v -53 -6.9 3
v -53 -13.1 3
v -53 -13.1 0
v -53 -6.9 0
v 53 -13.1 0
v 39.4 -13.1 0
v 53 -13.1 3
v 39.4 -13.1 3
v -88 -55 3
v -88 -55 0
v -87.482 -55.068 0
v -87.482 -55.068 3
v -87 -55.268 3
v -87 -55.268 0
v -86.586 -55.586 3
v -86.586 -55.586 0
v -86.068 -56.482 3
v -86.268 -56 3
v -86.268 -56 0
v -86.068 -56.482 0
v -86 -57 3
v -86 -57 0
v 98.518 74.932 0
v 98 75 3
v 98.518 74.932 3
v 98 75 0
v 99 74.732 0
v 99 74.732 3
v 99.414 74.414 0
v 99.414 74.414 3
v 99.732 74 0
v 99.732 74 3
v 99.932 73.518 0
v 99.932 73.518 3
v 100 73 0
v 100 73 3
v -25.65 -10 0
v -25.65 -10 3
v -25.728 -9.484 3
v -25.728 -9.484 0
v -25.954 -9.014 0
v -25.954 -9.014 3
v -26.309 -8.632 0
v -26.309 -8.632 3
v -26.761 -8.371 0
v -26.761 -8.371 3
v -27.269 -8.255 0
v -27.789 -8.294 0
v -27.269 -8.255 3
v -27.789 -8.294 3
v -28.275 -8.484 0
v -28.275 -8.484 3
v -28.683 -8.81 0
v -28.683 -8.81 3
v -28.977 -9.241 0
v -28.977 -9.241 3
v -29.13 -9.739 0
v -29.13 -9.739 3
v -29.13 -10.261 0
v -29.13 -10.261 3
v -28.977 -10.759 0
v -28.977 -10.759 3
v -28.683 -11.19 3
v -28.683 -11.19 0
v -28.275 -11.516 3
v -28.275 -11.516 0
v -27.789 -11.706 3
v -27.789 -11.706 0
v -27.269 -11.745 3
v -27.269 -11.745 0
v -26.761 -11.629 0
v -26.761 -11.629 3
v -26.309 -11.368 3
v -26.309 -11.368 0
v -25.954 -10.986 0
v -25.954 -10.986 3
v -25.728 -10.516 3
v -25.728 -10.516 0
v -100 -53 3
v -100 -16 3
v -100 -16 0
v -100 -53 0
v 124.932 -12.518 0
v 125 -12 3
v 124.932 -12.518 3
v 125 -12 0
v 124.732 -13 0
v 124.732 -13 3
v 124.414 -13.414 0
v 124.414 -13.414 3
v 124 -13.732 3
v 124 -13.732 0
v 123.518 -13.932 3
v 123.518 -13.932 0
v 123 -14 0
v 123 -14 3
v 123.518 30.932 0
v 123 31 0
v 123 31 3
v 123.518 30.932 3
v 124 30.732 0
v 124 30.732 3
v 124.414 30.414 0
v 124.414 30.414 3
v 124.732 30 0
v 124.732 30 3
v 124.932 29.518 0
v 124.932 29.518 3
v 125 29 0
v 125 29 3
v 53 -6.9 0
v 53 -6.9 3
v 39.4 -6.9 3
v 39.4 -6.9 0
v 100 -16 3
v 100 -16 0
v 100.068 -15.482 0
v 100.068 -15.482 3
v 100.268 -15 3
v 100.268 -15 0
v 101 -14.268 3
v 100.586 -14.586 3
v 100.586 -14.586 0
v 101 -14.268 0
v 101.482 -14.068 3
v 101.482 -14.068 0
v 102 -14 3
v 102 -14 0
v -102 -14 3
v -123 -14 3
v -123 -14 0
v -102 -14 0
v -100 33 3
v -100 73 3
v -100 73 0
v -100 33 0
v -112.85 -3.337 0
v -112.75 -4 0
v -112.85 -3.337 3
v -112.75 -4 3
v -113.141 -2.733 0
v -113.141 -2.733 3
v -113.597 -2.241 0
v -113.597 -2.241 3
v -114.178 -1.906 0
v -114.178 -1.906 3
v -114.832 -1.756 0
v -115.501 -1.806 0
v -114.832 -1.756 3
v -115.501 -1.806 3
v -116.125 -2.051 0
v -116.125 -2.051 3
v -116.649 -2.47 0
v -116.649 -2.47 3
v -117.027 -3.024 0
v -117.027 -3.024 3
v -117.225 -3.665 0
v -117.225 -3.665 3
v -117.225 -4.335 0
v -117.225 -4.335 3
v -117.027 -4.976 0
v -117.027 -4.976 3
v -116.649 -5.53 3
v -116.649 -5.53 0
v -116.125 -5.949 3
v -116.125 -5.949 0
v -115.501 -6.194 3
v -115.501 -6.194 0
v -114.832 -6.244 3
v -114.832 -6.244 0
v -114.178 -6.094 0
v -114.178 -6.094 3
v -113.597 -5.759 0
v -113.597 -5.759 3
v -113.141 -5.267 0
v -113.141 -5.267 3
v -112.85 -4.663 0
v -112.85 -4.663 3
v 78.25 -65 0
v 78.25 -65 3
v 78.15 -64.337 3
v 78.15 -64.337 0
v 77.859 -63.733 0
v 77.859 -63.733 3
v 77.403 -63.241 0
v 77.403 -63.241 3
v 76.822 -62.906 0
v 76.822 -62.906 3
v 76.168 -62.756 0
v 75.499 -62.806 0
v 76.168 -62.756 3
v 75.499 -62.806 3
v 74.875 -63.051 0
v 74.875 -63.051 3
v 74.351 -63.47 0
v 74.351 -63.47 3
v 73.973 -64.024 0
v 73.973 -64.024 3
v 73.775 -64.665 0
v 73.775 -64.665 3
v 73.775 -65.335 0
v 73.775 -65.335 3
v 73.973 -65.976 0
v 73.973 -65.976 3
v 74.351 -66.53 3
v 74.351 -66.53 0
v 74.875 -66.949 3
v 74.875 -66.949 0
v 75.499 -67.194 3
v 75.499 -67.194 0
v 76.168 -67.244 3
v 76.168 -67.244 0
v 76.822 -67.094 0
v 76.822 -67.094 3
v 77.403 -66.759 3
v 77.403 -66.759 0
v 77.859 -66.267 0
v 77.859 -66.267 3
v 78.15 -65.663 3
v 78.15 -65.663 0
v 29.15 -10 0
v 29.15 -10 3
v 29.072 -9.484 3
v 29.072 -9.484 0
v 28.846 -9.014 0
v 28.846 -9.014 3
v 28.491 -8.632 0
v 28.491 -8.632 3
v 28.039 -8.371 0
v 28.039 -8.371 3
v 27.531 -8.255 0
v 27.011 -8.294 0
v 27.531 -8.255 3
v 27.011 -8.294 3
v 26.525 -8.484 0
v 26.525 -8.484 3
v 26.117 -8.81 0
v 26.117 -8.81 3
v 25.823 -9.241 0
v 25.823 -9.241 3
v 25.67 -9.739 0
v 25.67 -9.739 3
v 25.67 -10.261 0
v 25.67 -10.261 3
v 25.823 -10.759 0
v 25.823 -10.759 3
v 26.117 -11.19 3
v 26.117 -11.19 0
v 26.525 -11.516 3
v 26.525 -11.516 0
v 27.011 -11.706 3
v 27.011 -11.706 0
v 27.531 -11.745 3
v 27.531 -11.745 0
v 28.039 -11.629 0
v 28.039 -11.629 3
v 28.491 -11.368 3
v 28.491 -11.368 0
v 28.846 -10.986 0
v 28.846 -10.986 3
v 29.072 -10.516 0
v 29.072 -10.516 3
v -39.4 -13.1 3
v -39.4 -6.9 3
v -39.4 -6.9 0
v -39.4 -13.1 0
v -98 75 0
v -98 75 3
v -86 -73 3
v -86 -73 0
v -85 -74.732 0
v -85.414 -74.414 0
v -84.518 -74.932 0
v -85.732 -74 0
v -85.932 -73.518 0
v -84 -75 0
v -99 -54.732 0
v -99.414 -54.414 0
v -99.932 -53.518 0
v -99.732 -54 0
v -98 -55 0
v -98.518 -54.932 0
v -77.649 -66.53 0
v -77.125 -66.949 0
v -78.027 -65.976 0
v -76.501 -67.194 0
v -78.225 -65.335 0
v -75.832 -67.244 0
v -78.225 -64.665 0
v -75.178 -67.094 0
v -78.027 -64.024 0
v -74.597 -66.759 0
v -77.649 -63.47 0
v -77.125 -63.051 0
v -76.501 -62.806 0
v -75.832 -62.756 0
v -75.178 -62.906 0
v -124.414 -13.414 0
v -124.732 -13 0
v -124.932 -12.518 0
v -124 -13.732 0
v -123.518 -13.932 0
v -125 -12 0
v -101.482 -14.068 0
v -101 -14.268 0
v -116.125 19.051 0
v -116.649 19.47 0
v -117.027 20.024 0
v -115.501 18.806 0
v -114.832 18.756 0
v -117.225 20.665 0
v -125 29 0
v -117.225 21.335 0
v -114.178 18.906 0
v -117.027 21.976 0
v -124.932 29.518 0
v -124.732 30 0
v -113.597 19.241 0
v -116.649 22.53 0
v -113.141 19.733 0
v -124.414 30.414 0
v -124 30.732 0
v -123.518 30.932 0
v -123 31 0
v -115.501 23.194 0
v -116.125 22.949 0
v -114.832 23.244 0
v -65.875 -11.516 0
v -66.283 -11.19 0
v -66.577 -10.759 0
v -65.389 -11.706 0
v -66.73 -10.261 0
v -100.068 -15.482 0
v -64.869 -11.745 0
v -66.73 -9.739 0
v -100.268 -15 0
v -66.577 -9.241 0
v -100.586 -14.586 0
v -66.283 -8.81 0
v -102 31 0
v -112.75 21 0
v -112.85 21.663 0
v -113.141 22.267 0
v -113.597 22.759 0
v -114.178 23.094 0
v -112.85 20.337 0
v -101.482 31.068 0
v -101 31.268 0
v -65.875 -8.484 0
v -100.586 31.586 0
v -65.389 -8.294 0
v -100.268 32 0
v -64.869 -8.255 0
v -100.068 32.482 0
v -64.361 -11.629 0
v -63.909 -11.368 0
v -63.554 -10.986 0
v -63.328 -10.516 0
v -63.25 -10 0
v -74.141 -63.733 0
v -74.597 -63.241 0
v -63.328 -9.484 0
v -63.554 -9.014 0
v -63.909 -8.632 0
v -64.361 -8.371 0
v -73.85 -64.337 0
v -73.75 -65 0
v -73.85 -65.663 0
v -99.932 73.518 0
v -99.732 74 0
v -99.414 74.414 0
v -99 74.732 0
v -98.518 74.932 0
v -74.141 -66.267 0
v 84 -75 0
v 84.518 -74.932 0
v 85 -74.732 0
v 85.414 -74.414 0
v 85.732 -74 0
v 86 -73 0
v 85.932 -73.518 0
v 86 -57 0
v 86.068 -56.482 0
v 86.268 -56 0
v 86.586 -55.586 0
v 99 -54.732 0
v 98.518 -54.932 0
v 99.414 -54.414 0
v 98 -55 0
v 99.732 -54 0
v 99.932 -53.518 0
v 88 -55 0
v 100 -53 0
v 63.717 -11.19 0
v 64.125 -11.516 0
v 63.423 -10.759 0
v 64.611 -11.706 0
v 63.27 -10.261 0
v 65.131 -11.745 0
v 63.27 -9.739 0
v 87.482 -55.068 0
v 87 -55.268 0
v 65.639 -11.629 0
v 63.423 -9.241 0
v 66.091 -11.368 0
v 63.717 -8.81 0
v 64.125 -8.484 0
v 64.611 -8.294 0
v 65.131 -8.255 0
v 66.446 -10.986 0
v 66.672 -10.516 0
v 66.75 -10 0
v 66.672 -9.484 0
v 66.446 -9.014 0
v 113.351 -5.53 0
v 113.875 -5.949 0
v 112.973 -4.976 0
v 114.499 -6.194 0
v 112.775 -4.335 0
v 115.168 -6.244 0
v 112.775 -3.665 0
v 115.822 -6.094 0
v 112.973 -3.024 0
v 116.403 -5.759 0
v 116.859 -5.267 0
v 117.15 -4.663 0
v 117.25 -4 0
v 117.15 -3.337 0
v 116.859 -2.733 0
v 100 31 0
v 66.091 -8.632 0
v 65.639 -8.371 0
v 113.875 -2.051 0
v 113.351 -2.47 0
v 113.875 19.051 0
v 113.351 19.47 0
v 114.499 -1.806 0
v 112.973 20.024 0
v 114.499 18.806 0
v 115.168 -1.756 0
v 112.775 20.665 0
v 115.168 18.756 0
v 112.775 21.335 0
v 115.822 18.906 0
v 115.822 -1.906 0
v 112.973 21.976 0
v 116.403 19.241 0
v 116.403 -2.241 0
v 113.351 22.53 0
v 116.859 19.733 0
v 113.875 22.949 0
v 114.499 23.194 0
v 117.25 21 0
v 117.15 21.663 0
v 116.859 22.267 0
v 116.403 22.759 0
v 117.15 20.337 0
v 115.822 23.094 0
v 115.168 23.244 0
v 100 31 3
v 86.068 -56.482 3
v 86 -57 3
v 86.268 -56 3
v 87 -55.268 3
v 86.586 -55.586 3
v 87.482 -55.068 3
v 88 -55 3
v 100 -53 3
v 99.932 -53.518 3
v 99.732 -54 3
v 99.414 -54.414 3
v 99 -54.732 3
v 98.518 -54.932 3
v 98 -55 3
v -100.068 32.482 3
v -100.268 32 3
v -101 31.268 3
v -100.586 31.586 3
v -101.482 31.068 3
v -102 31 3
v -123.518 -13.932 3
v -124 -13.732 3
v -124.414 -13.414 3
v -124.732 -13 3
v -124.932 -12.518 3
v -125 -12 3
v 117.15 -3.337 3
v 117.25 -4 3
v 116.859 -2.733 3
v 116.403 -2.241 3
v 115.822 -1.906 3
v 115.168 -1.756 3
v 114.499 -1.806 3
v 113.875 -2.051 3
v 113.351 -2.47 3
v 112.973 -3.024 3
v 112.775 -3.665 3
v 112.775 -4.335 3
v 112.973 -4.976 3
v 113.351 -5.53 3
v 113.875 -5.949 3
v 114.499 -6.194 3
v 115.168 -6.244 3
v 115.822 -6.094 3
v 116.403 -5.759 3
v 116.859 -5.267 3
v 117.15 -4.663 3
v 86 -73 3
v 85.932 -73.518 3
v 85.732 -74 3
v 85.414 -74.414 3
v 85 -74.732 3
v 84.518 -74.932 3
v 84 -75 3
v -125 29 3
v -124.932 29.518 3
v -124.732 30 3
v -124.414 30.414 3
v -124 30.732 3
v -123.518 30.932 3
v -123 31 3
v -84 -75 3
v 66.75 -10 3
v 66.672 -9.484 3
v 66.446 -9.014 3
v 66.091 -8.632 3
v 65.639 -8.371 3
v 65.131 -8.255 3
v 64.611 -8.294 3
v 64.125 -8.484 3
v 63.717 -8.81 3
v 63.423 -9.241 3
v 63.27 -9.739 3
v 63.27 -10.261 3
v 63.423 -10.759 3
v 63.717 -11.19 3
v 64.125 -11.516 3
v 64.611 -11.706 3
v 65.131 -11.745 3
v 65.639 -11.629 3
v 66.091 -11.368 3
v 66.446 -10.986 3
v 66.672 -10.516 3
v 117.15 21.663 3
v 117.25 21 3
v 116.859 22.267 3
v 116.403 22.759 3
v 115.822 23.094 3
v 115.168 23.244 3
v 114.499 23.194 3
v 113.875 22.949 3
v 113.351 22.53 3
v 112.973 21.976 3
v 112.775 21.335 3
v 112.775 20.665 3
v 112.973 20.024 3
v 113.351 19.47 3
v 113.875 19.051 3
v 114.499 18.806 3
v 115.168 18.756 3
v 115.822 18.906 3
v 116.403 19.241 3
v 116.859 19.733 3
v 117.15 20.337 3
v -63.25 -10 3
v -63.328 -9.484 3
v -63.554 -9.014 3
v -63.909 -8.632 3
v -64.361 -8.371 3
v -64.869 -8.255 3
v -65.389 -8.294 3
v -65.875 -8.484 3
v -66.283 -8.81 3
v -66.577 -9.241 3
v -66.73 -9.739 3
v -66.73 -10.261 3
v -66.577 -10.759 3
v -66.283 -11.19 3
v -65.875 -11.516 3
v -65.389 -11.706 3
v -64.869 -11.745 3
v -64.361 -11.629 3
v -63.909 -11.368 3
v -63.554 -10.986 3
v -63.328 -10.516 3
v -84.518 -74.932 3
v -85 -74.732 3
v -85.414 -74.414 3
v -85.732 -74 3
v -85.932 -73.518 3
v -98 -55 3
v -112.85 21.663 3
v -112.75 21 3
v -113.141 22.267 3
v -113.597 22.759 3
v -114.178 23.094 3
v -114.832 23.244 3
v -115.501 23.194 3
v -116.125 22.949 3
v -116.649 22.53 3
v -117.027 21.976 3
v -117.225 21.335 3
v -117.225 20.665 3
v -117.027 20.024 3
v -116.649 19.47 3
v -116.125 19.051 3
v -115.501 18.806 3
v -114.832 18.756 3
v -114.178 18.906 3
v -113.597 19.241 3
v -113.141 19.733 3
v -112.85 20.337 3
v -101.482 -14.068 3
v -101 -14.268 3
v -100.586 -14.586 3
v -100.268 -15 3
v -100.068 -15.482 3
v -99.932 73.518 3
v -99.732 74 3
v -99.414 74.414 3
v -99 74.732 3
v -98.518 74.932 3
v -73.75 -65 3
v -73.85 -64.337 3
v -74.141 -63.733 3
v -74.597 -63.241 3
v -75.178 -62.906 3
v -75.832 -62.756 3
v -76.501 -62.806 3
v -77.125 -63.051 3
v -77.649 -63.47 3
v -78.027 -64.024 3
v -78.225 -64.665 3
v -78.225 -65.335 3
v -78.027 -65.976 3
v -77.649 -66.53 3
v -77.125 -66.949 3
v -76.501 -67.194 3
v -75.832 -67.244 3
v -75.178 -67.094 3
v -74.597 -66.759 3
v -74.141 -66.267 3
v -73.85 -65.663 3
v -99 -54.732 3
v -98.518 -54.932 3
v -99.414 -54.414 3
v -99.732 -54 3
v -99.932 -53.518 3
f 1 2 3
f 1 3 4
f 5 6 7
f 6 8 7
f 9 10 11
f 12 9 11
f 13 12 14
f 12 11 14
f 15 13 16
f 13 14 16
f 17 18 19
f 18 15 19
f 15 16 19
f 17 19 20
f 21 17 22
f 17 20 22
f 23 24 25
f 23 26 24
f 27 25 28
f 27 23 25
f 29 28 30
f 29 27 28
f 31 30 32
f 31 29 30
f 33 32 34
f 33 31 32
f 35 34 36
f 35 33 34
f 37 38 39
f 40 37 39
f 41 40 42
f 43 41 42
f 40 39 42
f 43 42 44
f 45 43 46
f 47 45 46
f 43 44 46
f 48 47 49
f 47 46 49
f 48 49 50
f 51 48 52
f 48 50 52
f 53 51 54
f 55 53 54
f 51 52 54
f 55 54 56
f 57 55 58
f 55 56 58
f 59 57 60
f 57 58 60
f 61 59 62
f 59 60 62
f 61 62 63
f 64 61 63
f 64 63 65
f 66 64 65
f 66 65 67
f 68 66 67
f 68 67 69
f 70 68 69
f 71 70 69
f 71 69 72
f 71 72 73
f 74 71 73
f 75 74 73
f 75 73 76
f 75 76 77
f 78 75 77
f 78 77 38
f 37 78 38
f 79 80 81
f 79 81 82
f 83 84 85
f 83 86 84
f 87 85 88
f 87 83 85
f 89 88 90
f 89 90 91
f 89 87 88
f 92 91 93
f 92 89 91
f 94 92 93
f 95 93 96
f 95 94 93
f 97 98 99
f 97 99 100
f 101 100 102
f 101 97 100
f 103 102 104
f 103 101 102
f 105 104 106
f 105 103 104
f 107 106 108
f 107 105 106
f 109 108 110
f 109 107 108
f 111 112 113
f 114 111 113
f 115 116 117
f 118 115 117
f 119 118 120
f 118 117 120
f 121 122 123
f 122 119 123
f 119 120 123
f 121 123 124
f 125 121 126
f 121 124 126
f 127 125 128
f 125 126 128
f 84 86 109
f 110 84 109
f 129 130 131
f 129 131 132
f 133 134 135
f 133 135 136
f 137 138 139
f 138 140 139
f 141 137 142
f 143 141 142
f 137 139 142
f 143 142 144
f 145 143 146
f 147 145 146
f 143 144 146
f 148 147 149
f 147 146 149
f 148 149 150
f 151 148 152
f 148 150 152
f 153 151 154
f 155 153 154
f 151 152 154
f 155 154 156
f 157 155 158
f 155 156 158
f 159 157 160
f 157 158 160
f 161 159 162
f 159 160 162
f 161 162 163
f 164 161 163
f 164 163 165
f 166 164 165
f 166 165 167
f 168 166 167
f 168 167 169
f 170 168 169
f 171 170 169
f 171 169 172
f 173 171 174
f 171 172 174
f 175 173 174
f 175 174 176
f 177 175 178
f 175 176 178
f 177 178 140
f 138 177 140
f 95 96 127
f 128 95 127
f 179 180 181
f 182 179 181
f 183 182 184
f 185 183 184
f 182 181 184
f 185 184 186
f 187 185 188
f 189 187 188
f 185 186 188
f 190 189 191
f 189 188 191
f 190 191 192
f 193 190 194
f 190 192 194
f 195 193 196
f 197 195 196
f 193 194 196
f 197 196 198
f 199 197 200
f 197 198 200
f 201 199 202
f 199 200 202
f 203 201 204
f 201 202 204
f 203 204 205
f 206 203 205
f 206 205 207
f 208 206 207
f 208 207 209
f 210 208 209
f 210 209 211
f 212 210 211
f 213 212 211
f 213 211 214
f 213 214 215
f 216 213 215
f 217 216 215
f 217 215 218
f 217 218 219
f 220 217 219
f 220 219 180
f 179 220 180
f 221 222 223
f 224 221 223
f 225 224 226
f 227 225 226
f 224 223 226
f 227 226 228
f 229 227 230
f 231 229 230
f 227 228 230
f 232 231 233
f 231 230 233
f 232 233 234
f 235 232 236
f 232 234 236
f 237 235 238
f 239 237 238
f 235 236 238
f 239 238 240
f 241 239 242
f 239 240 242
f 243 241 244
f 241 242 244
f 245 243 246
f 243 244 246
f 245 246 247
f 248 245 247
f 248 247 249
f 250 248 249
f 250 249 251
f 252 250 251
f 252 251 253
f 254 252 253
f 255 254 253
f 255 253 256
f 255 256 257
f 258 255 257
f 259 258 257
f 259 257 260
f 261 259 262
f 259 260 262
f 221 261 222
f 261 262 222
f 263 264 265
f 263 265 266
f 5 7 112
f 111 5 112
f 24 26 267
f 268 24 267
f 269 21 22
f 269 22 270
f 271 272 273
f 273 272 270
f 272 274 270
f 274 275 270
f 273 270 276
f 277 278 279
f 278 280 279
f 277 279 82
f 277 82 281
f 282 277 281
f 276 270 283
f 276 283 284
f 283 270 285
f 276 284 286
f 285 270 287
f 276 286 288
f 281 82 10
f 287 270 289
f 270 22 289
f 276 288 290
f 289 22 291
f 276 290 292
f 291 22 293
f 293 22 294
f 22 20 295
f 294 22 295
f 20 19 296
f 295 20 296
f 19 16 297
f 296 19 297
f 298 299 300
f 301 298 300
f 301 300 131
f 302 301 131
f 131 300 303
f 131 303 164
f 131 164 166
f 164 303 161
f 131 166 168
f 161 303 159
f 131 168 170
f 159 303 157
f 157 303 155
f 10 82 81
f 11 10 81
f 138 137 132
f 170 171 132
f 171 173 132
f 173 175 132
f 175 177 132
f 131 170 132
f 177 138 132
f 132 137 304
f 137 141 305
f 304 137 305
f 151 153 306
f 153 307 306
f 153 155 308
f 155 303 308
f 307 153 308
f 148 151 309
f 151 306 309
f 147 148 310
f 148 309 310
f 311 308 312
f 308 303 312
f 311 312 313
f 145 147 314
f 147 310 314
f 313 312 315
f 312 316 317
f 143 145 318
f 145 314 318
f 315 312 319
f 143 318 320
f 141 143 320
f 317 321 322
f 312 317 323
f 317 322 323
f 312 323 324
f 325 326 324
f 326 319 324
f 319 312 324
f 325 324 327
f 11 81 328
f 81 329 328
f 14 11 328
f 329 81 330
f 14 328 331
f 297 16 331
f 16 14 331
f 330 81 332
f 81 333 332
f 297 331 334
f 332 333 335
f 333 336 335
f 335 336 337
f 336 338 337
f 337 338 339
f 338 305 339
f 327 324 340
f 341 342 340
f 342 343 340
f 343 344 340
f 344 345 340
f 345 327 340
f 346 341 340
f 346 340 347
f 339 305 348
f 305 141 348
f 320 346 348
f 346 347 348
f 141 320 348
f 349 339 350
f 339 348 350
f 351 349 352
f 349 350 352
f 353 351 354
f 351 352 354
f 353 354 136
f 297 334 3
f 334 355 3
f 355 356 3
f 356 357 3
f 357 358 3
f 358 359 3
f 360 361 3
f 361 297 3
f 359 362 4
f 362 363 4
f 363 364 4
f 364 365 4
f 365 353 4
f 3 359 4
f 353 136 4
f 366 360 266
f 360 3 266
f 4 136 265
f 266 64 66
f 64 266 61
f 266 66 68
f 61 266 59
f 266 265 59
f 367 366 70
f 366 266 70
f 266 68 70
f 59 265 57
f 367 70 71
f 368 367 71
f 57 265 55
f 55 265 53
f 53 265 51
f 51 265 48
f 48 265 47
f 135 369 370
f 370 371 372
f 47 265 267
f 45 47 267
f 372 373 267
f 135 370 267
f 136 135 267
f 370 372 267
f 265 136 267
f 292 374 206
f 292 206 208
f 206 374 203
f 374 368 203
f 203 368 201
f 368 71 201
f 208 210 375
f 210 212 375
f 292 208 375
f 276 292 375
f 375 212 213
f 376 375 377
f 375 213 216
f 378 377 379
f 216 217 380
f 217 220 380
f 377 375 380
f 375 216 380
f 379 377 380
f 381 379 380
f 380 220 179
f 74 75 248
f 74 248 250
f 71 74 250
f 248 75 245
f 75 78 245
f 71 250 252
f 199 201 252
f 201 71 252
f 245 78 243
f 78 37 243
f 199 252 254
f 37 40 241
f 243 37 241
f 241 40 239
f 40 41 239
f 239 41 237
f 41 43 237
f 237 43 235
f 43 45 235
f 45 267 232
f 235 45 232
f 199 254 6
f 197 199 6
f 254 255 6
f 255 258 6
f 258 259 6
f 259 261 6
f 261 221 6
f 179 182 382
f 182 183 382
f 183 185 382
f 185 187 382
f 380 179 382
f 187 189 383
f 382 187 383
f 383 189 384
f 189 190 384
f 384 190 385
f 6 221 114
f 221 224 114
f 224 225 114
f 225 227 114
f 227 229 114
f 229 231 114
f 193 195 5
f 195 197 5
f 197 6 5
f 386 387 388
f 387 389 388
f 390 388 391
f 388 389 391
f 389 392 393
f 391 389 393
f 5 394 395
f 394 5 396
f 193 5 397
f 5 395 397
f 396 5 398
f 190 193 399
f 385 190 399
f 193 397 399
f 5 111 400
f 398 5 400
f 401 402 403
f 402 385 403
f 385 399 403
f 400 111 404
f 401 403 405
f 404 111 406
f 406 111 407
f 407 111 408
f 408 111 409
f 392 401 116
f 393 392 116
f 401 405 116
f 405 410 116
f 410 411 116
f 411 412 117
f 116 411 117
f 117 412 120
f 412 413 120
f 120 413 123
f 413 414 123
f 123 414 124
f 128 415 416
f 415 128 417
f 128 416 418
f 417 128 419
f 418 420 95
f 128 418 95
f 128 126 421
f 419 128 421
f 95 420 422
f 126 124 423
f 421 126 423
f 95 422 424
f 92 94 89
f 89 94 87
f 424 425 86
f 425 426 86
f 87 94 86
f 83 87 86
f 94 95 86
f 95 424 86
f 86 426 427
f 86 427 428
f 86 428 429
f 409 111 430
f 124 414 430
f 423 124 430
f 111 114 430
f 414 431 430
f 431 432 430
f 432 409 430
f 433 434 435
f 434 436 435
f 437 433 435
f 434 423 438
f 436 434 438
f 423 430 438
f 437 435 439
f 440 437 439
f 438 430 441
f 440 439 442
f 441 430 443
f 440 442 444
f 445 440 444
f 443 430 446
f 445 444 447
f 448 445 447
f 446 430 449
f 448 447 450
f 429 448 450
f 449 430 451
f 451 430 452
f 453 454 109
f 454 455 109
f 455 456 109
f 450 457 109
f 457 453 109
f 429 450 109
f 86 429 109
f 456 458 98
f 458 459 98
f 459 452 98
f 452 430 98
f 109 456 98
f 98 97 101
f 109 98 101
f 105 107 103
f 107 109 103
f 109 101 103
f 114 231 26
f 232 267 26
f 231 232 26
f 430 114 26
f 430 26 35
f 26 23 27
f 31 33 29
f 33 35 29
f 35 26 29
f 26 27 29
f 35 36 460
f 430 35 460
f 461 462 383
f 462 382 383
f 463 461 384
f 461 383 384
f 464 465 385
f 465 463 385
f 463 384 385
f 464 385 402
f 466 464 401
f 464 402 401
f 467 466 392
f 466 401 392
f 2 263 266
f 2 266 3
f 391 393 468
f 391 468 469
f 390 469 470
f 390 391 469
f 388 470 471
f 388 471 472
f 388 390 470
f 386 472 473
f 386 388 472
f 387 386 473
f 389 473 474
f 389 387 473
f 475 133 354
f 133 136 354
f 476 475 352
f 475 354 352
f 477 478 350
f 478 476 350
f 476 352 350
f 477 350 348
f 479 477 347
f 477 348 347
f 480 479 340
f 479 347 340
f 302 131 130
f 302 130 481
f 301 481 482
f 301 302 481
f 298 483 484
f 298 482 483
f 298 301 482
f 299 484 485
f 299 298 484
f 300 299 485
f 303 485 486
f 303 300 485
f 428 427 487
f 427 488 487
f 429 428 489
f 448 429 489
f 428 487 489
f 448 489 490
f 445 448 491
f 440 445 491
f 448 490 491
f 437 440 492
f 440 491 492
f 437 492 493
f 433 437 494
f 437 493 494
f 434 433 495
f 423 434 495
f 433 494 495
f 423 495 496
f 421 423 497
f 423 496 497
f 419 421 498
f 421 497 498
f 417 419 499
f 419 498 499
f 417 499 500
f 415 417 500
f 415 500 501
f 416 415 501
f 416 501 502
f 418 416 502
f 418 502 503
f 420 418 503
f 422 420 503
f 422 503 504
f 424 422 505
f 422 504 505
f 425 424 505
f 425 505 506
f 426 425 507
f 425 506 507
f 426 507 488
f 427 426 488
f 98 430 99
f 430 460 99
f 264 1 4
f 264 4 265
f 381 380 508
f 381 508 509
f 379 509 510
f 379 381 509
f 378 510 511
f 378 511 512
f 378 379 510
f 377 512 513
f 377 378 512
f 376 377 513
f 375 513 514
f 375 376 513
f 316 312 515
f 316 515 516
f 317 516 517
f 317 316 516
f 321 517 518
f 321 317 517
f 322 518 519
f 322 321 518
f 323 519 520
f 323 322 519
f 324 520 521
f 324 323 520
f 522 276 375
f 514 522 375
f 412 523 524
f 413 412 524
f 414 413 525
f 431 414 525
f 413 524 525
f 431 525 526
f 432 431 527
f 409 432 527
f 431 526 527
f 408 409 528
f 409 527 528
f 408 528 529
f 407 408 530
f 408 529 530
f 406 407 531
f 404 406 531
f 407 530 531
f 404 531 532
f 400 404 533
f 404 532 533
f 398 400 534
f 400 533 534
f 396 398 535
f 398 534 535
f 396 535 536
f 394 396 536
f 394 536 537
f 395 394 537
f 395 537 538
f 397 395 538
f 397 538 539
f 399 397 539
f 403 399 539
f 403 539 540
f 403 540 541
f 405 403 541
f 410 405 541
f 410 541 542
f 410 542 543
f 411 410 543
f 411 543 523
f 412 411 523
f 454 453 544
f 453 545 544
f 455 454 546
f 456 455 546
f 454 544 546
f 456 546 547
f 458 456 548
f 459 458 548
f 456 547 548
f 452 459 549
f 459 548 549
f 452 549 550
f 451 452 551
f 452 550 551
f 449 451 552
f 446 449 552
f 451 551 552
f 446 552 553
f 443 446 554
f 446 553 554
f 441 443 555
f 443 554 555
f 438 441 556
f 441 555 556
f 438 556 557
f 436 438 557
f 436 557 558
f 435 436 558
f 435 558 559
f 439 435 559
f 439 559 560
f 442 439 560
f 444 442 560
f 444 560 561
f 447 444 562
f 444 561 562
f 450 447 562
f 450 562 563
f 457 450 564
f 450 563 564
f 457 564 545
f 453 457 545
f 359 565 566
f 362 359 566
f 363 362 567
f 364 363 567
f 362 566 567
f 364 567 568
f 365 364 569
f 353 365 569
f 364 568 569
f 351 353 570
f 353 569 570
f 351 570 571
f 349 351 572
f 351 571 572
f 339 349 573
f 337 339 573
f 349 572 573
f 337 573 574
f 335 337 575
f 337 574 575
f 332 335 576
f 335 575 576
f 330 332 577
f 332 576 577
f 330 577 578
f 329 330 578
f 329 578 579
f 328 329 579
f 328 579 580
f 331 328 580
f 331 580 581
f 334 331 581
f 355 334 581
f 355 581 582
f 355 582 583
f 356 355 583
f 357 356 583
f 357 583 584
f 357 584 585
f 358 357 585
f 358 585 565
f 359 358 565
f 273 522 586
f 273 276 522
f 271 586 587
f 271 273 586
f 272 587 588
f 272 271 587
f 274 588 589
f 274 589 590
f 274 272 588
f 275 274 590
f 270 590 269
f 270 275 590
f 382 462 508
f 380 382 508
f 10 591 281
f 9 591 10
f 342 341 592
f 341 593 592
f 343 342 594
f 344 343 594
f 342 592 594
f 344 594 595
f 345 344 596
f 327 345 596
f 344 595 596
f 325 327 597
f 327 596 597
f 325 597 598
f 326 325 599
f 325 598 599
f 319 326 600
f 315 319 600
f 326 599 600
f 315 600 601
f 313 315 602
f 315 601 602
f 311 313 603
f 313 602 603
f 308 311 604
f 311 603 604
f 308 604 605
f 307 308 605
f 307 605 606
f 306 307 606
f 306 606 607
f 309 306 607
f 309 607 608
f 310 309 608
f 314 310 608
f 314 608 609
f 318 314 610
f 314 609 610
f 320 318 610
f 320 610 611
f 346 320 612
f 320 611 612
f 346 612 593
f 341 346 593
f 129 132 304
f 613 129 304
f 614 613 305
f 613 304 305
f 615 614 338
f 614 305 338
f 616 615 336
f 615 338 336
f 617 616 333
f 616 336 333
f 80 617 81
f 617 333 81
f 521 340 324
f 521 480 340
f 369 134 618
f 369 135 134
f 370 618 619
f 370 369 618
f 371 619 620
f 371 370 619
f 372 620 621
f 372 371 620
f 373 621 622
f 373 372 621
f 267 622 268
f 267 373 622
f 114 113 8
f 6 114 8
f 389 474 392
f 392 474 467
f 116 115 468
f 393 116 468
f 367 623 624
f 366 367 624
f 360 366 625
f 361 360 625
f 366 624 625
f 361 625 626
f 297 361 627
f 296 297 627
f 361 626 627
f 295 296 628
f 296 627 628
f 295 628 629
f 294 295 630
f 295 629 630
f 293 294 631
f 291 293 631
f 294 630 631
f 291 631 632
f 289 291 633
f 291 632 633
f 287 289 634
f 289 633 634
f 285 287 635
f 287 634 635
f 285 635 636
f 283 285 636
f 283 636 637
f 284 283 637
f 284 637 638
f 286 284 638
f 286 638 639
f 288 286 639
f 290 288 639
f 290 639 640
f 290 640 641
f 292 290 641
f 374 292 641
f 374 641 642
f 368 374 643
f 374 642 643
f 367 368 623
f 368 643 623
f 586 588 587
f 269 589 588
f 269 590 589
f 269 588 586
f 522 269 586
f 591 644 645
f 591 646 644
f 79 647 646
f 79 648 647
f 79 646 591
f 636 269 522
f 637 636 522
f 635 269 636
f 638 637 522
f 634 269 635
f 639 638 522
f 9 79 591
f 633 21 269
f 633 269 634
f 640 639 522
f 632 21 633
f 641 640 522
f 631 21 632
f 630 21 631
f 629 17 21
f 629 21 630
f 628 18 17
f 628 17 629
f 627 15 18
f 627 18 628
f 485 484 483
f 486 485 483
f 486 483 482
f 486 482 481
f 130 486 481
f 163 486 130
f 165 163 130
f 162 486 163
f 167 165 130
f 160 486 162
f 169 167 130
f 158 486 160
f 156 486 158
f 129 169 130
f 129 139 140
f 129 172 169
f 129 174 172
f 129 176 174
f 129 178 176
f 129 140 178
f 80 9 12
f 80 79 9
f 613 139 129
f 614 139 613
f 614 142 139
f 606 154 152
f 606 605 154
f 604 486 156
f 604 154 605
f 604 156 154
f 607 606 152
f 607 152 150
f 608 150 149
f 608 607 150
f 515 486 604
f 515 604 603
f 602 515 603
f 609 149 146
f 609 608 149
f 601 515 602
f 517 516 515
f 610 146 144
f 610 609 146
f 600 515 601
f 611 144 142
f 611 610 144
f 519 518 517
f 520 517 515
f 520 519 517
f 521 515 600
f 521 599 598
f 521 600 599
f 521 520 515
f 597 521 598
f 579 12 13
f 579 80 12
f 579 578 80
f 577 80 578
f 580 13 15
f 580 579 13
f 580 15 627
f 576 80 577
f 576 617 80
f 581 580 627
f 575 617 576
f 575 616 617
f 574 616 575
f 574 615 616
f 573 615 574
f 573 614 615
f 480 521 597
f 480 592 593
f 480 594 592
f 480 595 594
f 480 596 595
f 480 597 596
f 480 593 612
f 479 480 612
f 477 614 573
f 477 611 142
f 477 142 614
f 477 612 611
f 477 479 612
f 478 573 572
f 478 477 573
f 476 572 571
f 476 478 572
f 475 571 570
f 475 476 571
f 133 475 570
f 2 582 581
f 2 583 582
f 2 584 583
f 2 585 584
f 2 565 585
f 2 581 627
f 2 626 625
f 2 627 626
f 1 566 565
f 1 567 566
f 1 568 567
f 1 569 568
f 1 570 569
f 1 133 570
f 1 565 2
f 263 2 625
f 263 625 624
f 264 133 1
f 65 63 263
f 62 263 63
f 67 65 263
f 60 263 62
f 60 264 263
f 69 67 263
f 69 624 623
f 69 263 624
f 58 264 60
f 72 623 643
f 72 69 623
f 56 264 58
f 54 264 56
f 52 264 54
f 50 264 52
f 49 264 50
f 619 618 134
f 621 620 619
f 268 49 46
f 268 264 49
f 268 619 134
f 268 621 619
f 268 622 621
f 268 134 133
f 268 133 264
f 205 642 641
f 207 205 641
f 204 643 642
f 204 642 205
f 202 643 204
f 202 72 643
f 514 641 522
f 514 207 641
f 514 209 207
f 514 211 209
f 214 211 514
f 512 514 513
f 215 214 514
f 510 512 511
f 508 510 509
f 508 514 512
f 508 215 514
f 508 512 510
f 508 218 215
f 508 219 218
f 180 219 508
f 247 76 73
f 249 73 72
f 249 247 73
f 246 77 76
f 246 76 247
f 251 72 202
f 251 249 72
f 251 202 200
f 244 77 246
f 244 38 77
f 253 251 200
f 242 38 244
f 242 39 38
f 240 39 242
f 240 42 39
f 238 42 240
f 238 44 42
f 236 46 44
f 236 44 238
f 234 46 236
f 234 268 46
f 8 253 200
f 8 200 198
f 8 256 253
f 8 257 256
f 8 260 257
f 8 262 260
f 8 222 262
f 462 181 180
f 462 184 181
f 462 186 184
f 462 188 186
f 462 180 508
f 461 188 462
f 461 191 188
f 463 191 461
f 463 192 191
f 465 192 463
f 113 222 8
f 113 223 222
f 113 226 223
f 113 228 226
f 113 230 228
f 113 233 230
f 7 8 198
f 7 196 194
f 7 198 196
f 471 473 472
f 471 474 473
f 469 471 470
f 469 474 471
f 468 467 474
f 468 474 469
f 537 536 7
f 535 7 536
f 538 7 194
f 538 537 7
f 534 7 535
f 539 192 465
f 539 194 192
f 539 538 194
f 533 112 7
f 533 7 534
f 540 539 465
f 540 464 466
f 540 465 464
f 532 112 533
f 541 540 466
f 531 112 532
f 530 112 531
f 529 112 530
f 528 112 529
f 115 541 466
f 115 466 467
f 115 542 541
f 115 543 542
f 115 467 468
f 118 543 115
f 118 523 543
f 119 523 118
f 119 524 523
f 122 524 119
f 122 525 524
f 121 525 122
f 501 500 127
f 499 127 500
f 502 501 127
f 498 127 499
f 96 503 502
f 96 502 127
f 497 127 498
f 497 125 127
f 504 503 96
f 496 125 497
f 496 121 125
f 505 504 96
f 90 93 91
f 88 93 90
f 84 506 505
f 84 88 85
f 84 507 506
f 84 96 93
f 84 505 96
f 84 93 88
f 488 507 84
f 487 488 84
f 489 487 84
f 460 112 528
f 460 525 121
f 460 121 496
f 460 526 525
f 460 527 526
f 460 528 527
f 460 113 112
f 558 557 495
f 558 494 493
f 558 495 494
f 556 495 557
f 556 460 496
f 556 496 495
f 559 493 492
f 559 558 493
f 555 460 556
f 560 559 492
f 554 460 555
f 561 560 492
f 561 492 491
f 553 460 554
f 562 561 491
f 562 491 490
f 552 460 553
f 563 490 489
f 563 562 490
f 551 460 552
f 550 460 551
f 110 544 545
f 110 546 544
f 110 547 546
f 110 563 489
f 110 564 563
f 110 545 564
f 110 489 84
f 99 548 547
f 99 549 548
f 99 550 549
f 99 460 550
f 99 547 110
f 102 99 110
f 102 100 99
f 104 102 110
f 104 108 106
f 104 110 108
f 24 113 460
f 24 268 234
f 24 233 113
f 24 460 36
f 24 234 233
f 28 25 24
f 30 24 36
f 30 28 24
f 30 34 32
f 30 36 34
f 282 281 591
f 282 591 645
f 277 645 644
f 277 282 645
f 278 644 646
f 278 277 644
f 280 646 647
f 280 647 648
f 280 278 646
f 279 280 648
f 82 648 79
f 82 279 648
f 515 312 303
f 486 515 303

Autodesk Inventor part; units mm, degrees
ref_plane "YZ Plane" through (0, 0, 0) normal (1, 0, 0) x (0, 1, 0)
ref_plane "XZ Plane" through (0, 0, 0) normal (0, 1, 0) x (-1, 0, 0)
ref_plane "XY Plane" through (0, 0, 0) normal (0, 0, 1) x (1, 0, 0)
sketch "Sketch1" plane through (0, 0, 0) normal (0, 0, 1) x (1, 0, 0)
  line L0 (-125, -75) -> (125, -75)
  line L1 (125, -75) -> (125, 75)
  line L2 (125, 75) -> (-125, 75)
  line L3 (-125, 75) -> (-125, -75)
  line L4 (-125, -75) -> (125, 75) construction
  line L5 (125, -75) -> (-125, 75) construction
  point P0 (0, 0)
  dimension "d0" = 150
  dimension "d1" = 250
extrude "Extrusion1" add sketch "Sketch1" along normal blind 3
sketch "Sketch2" plane through (0, 0, 3) normal (0, 0, 1) x (1, 0, 0)
  line L0 (125, -75) -> (125, 75) construction
  line L1 (125, 75) -> (-125, 75) construction
  line L2 (-125, 75) -> (-125, -75) construction
  line L3 (-125, -75) -> (125, -75) construction
  line L4 (-125, 75) -> (-125, -75) construction
  line L5 (125, 75) -> (-125, 75) construction
  line L6 (-125, 75) -> (-100, 75)
  line L7 (-100, 75) -> (-100, 31)
  line L8 (-100, 31) -> (-125, 31)
  line L9 (-125, 31) -> (-125, 75)
  line L10 (-125, -14) -> (-100, -14)
  line L11 (-100, -14) -> (-100, -55)
  line L12 (-100, -55) -> (-86, -55)
  line L13 (-86, -55) -> (-86, -75)
  line L14 (-125, -75) -> (125, -75) construction
  line L15 (-125, -14) -> (-125, -75)
  line L16 (-125, -75) -> (-86, -75)
  line L17 (0, -105) -> (0, 105) construction
  line L18 (125, 75) -> (125, -75) construction
  line L19 (125, 75) -> (125, -75) construction
  line L20 (125, 75) -> (100, 75)
  line L21 (100, 75) -> (100, 31)
  line L22 (100, 31) -> (125, 31)
  line L23 (125, 31) -> (125, 75)
  line L24 (125, -14) -> (100, -14)
  line L25 (100, -14) -> (100, -55)
  line L26 (100, -55) -> (86, -55)
  line L27 (86, -55) -> (86, -75)
  line L28 (125, -14) -> (125, -75)
  line L29 (125, -75) -> (86, -75)
  point P0 (0, 0)
  dimension "d4" = 25
  dimension "d5" = 44
  dimension "d6" = 25
  dimension "d7" = 20
  dimension "d10" = 39
  dimension "d11" = 61
extrude "Extrusion2" cut sketch "Sketch2" against normal blind 3
sketch "Sketch3" plane through (0, 0, 3) normal (0, 0, 1) x (1, 0, 0)
  point P0 (0, 0)
fillet "Fillet1" radius 2 15 edges at (86, -75, 1.5) (86, -55, 1.5) (100, -55, 1.5) (100, -14, 1.5) (125, -14, 1.5) (125, 31, 1.5) (100, 75, 1.5) (-100, 75, 1.5) (-100, 31, 1.5) (-125, 31, 1.5) (-125, -14, 1.5) (-100, -14, 1.5) (-100, -55, 1.5) (-86, -55, 1.5) (-86, -75, 1.5)
sketch "Sketch4" plane through (0, 0, 3) normal (0, 0, 1) x (1, 0, 0)
  circle A0 centre (-115, 21) radius 2.25
  circle A1 centre (-115, -4) radius 2.25
  circle A2 centre (-76, -65) radius 2.25
  line L0 (-125, 29) -> (-125, -12) construction
  line L1 (-102, 31) -> (-123, 31) construction
  line L2 (-123, -14) -> (-102, -14) construction
  line L3 (-86, -57) -> (-86, -73) construction
  line L4 (-84, -75) -> (84, -75) construction
  line L5 (0, -105) -> (0, 105) projected
  circle A3 centre (115, 21) radius 2.25
  circle A4 centre (115, -4) radius 2.25
  circle A5 centre (76, -65) radius 2.25
  line L6 (125, 29) -> (125, -12) construction
  line L7 (102, 31) -> (123, 31) construction
  line L8 (123, -14) -> (102, -14) construction
  line L9 (86, -57) -> (86, -73) construction
  point P0 (0, 0)
  dimension "d13" = 4.5
  dimension "d14" = 4.5
  dimension "d15" = 4.5
  dimension "d16" = 10
  dimension "d17" = 10
  dimension "d18" = 10
  dimension "d19" = 10
  dimension "d20" = 10
  dimension "d21" = 10
extrude "Extrusion3" cut sketch "Sketch4" against normal blind 3
sketch "Sketch6" plane through (0, 0, 3) normal (0, 0, 1) x (1, 0, 0)
  circle A0 centre (65, -10) radius 1.75
  line L0 (65, -10) -> (27.4, -10) construction
  circle A1 centre (27.4, -10) radius 1.75
  line L1 (-84, -75) -> (84, -75) projected
  line L2 (100, -53) -> (100, -16) projected
  line L3 (0, -105.5799) -> (0, 105.5799) projected
  circle A2 centre (-65, -10) radius 1.75
  line L4 (-65, -10) -> (-27.4, -10) construction
  circle A3 centre (-27.4, -10) radius 1.75
  line L5 (27.4, -10) -> (65, -10) construction
  line L6 (39.4, -13.1) -> (53, -13.1)
  line L7 (53, -13.1) -> (53, -6.9)
  line L8 (53, -6.9) -> (39.4, -6.9)
  line L9 (39.4, -6.9) -> (39.4, -13.1)
  line L10 (39.4, -13.1) -> (53, -6.9) construction
  line L11 (53, -13.1) -> (39.4, -6.9) construction
  line L12 (-39.4, -13.1) -> (-53, -13.1)
  line L13 (-53, -13.1) -> (-53, -6.9)
  line L14 (-53, -6.9) -> (-39.4, -6.9)
  line L15 (-39.4, -6.9) -> (-39.4, -13.1)
  line L16 (-39.4, -13.1) -> (-53, -6.9) construction
  line L17 (-53, -13.1) -> (-39.4, -6.9) construction
  point P0 (0, 0)
  point P1 (46.2, -10)
  point P2 (-46.2, -10)
  dimension "d24" = 3.5
  dimension "d25" = 3.5
  dimension "d26" = 37.6
  dimension "d27" = 65
  dimension "d28" = 35
  dimension "d31" = 13.6
  dimension "d32" = 6.2
  dimension "d33" = 18.8
  dimension "d34" = 18.8
extrude "Extrusion4" cut sketch "Sketch6" against normal blind 10
sketch "Sketch8" plane through (0, 0, 3) normal (0, 0, 1) x (1, 0, 0)
  circle A0 centre (-65, -10) radius 1.75 projected
  circle A1 centre (65, -10) radius 1.75 projected
  line L0 (39.4, -6.9) -> (53, -6.9) projected
  line L1 (53, -6.9) -> (53, -13.1) projected
  line L2 (53, -13.1) -> (39.4, -13.1) projected
  line L3 (39.4, -13.1) -> (39.4, -6.9) projected
  circle A2 centre (-27.4, -10) radius 1.75 projected
  circle A3 centre (27.4, -10) radius 1.75 projected
  line L4 (-39.4, -13.1) -> (-53, -13.1) projected
  line L5 (-53, -13.1) -> (-53, -6.9) projected
  line L6 (-53, -6.9) -> (-39.4, -6.9) projected
  line L7 (-39.4, -6.9) -> (-39.4, -13.1) projected
  circle A4 centre (-76, -65) radius 2.25 projected
  circle A5 centre (115, 21) radius 2.25 projected
  circle A6 centre (-115, -4) radius 2.25 projected
  circle A7 centre (76, -65) radius 2.25 projected
  circle A8 centre (115, -4) radius 2.25 projected
  circle A9 centre (-115, 21) radius 2.25 projected
  arc A10 (-86, -73) -> (-84, -75) centre (-84, -73) ccw projected
  line L8 (-84, -75) -> (84, -75) projected
  arc A11 (84, -75) -> (86, -73) centre (84, -73) ccw projected
  line L9 (86, -73) -> (86, -57) projected
  arc A12 (88, -55) -> (86, -57) centre (88, -57) ccw projected
  line L10 (88, -55) -> (98, -55) projected
  arc A13 (98, -55) -> (100, -53) centre (98, -53) ccw projected
  line L11 (100, -53) -> (100, -16) projected
  arc A14 (102, -14) -> (100, -16) centre (102, -16) ccw projected
  line L12 (102, -14) -> (123, -14) projected
  arc A15 (123, -14) -> (125, -12) centre (123, -12) ccw projected
  line L13 (125, -12) -> (125, 29) projected
  arc A16 (125, 29) -> (123, 31) centre (123, 29) ccw projected
  line L14 (123, 31) -> (100, 31) projected
  line L15 (100, 31) -> (100, 73) projected
  arc A17 (100, 73) -> (98, 75) centre (98, 73) ccw projected
  line L16 (98, 75) -> (-98, 75) projected
  arc A18 (-98, 75) -> (-100, 73) centre (-98, 73) ccw projected
  line L17 (-100, 73) -> (-100, 33) projected
  arc A19 (-102, 31) -> (-100, 33) centre (-102, 33) ccw projected
  line L18 (-102, 31) -> (-123, 31) projected
  arc A20 (-123, 31) -> (-125, 29) centre (-123, 29) ccw projected
  line L19 (-125, 29) -> (-125, -12) projected
  arc A21 (-125, -12) -> (-123, -14) centre (-123, -12) ccw projected
  line L20 (-123, -14) -> (-102, -14) projected
  arc A22 (-100, -16) -> (-102, -14) centre (-102, -16) ccw projected
  line L21 (-100, -16) -> (-100, -53) projected
  arc A23 (-100, -53) -> (-98, -55) centre (-98, -53) ccw projected
  line L22 (-98, -55) -> (-88, -55) projected
  arc A24 (-86, -57) -> (-88, -55) centre (-88, -57) ccw projected
  line L23 (-86, -57) -> (-86, -73) projected
  point P0 (0, 0)
equation "\"d6\" = d4"
equation "\"d14\" = d13"
equation "\"d15\" = d14"
equation "\"d17\" = d16"
equation "\"d18\" = d16"
equation "\"d19\" = d16"
equation "\"d20\" = d19"
equation "\"d21\" = d19"
equation "\"d25\" = d24"
properties part number "BackAcrylicSheet"
